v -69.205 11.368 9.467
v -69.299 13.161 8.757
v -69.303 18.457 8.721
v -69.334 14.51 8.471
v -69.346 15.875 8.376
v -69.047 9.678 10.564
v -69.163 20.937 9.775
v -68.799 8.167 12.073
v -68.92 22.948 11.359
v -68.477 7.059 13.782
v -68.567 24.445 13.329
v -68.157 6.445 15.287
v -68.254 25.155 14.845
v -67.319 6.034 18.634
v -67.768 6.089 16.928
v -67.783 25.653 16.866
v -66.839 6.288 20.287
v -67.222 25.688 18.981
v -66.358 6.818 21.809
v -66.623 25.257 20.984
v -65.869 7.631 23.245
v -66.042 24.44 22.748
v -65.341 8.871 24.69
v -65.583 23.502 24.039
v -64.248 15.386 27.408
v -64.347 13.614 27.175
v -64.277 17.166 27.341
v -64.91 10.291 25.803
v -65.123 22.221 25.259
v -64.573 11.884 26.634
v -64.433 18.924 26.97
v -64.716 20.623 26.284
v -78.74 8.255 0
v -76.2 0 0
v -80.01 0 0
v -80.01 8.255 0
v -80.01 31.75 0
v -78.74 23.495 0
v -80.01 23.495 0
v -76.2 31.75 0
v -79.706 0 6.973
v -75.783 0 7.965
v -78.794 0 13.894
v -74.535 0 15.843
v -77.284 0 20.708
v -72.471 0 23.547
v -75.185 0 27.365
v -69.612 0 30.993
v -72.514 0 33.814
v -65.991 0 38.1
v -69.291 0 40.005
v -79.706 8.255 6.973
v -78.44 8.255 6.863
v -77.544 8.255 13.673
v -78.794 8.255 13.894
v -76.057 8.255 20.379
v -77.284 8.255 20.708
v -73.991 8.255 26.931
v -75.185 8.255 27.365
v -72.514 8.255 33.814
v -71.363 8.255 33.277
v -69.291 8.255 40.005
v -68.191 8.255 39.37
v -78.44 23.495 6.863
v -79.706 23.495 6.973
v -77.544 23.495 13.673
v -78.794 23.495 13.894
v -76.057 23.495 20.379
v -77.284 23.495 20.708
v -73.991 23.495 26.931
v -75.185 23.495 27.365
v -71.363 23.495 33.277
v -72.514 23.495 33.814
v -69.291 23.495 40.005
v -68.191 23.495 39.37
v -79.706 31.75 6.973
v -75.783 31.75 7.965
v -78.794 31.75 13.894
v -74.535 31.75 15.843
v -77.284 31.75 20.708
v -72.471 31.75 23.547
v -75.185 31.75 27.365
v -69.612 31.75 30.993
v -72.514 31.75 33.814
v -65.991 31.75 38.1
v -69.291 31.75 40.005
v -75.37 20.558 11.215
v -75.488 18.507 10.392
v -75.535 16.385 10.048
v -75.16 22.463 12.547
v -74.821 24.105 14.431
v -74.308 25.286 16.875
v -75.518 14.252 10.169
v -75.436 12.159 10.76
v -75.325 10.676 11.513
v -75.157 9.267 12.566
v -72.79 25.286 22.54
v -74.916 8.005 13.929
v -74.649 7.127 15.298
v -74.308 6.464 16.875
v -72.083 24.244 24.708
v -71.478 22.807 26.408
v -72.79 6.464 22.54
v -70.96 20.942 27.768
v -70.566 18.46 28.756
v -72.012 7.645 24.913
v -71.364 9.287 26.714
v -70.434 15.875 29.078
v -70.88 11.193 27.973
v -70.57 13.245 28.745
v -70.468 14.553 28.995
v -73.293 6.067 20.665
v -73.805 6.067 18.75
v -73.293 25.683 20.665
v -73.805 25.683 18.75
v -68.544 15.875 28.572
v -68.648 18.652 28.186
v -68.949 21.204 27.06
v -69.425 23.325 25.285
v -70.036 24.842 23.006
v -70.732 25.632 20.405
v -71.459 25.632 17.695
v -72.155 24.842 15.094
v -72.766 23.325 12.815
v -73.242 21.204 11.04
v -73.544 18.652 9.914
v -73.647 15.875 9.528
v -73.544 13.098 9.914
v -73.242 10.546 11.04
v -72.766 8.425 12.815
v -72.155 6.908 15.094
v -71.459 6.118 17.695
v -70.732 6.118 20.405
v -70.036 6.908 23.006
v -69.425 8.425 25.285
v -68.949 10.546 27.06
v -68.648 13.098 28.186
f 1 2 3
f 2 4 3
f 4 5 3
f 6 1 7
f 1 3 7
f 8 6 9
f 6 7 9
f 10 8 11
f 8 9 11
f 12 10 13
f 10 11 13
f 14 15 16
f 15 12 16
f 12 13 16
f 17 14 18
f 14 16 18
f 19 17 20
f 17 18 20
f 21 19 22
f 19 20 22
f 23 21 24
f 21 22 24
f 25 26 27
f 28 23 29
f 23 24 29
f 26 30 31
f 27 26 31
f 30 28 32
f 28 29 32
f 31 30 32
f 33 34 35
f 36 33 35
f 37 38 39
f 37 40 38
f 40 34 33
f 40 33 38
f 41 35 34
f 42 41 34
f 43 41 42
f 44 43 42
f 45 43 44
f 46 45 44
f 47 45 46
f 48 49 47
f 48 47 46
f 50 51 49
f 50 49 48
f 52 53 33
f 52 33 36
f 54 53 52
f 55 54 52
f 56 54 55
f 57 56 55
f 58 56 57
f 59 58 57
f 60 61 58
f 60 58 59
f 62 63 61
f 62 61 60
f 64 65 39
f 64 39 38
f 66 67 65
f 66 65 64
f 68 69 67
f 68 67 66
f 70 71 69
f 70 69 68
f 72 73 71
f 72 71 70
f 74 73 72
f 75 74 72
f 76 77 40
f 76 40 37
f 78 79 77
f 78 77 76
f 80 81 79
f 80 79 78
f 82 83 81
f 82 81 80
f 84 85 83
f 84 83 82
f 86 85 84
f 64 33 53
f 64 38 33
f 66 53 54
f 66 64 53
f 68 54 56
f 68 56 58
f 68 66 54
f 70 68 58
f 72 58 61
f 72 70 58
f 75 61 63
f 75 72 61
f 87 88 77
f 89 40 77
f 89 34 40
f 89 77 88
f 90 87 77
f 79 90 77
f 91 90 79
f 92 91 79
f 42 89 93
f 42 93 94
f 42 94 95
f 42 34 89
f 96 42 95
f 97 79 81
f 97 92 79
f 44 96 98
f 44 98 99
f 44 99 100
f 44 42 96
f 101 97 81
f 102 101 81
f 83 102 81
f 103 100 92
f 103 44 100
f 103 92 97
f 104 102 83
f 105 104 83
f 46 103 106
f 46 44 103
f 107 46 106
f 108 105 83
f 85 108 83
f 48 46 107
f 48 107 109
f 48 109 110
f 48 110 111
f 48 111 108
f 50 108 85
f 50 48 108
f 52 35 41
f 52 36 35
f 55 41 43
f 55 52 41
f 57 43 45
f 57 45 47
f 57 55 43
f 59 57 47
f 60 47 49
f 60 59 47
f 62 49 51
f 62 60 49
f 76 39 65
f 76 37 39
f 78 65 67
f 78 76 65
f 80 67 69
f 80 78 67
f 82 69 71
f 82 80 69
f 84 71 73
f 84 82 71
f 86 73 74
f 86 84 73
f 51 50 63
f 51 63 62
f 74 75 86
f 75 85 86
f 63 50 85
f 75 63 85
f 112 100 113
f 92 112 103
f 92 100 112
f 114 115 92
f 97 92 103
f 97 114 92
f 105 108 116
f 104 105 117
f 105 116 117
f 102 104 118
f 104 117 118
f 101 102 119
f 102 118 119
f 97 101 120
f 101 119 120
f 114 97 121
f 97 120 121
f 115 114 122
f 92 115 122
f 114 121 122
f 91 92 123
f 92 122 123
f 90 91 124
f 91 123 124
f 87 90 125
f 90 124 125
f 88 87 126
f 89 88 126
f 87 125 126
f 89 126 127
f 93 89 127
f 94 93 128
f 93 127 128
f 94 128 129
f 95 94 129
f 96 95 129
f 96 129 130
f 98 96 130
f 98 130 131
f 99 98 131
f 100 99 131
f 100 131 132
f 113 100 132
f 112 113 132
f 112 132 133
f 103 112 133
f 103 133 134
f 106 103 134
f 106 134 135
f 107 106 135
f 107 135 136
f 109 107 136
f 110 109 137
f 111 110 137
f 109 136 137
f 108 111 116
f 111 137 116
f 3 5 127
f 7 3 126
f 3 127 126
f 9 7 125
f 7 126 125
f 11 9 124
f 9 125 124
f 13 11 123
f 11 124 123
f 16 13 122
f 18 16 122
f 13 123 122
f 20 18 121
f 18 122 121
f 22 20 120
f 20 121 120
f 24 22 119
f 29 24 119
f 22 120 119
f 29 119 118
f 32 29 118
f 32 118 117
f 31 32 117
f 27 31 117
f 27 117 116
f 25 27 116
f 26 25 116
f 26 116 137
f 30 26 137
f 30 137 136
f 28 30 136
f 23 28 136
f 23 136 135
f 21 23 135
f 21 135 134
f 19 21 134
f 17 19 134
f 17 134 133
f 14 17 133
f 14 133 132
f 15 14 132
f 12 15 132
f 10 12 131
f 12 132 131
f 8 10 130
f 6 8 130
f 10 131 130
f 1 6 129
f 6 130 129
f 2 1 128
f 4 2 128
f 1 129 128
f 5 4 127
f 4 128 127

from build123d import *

# Parameters (mm, degrees)
REVOLVE1_ANGLE      = 30
SKETCH2_R           = 9.85774
BOSS_EXTRUDE1_DEPTH = 2.54
SKETCH3_R           = 9.85774
BOSS_EXTRUDE2_DEPTH = 12.7
SKETCH4_W           = 69.85
SKETCH4_H           = 31.75
CUT_REVOLVE1_ANGLE  = 30


with BuildPart() as part:
    # Sketch1 → Revolve1 (revolve)
    with BuildSketch(Plane.XY):
        Polygon((-80.01, 0), (-80.01, 8.255), (-78.74, 8.255), (-78.74, 23.495), (-80.01, 23.495), (-80.01, 31.75), (-76.2, 31.75), (-76.2, 0), align=None)
    revolve(axis=Axis((0, 0, 0), (0, 1, 0)), revolution_arc=REVOLVE1_ANGLE)

    # Sketch2 → Boss-Extrude1 (add)
    with BuildSketch(Plane(origin=(-71.095567884, 0, 19.05), x_dir=(0.258819045, 0, 0.965925826), z_dir=(-0.965925826, 0, 0.258819045))):
        with Locations((0, 15.875)):
            Circle(SKETCH2_R)
    extrude(amount=BOSS_EXTRUDE1_DEPTH)

    # Sketch3 → Boss-Extrude2 (add)
    with BuildSketch(Plane(origin=(-71.095567884, 0, 19.05), x_dir=(-0.258819045, 0, -0.965925826), z_dir=(0.965925826, 0, -0.258819045))):
        with Locations((0, 15.875)):
            Circle(SKETCH3_R)
    extrude(amount=BOSS_EXTRUDE2_DEPTH)

    # Sketch4 → Cut-Revolve1 (revolve, cut)
    with BuildSketch(Plane.XY):
        with Locations((-34.925, 15.875)):
            Rectangle(SKETCH4_W, SKETCH4_H)
    revolve(axis=Axis((0, 0, 0), (0, 1, 0)), revolution_arc=CUT_REVOLVE1_ANGLE, mode=Mode.SUBTRACT)


solid = part.part
